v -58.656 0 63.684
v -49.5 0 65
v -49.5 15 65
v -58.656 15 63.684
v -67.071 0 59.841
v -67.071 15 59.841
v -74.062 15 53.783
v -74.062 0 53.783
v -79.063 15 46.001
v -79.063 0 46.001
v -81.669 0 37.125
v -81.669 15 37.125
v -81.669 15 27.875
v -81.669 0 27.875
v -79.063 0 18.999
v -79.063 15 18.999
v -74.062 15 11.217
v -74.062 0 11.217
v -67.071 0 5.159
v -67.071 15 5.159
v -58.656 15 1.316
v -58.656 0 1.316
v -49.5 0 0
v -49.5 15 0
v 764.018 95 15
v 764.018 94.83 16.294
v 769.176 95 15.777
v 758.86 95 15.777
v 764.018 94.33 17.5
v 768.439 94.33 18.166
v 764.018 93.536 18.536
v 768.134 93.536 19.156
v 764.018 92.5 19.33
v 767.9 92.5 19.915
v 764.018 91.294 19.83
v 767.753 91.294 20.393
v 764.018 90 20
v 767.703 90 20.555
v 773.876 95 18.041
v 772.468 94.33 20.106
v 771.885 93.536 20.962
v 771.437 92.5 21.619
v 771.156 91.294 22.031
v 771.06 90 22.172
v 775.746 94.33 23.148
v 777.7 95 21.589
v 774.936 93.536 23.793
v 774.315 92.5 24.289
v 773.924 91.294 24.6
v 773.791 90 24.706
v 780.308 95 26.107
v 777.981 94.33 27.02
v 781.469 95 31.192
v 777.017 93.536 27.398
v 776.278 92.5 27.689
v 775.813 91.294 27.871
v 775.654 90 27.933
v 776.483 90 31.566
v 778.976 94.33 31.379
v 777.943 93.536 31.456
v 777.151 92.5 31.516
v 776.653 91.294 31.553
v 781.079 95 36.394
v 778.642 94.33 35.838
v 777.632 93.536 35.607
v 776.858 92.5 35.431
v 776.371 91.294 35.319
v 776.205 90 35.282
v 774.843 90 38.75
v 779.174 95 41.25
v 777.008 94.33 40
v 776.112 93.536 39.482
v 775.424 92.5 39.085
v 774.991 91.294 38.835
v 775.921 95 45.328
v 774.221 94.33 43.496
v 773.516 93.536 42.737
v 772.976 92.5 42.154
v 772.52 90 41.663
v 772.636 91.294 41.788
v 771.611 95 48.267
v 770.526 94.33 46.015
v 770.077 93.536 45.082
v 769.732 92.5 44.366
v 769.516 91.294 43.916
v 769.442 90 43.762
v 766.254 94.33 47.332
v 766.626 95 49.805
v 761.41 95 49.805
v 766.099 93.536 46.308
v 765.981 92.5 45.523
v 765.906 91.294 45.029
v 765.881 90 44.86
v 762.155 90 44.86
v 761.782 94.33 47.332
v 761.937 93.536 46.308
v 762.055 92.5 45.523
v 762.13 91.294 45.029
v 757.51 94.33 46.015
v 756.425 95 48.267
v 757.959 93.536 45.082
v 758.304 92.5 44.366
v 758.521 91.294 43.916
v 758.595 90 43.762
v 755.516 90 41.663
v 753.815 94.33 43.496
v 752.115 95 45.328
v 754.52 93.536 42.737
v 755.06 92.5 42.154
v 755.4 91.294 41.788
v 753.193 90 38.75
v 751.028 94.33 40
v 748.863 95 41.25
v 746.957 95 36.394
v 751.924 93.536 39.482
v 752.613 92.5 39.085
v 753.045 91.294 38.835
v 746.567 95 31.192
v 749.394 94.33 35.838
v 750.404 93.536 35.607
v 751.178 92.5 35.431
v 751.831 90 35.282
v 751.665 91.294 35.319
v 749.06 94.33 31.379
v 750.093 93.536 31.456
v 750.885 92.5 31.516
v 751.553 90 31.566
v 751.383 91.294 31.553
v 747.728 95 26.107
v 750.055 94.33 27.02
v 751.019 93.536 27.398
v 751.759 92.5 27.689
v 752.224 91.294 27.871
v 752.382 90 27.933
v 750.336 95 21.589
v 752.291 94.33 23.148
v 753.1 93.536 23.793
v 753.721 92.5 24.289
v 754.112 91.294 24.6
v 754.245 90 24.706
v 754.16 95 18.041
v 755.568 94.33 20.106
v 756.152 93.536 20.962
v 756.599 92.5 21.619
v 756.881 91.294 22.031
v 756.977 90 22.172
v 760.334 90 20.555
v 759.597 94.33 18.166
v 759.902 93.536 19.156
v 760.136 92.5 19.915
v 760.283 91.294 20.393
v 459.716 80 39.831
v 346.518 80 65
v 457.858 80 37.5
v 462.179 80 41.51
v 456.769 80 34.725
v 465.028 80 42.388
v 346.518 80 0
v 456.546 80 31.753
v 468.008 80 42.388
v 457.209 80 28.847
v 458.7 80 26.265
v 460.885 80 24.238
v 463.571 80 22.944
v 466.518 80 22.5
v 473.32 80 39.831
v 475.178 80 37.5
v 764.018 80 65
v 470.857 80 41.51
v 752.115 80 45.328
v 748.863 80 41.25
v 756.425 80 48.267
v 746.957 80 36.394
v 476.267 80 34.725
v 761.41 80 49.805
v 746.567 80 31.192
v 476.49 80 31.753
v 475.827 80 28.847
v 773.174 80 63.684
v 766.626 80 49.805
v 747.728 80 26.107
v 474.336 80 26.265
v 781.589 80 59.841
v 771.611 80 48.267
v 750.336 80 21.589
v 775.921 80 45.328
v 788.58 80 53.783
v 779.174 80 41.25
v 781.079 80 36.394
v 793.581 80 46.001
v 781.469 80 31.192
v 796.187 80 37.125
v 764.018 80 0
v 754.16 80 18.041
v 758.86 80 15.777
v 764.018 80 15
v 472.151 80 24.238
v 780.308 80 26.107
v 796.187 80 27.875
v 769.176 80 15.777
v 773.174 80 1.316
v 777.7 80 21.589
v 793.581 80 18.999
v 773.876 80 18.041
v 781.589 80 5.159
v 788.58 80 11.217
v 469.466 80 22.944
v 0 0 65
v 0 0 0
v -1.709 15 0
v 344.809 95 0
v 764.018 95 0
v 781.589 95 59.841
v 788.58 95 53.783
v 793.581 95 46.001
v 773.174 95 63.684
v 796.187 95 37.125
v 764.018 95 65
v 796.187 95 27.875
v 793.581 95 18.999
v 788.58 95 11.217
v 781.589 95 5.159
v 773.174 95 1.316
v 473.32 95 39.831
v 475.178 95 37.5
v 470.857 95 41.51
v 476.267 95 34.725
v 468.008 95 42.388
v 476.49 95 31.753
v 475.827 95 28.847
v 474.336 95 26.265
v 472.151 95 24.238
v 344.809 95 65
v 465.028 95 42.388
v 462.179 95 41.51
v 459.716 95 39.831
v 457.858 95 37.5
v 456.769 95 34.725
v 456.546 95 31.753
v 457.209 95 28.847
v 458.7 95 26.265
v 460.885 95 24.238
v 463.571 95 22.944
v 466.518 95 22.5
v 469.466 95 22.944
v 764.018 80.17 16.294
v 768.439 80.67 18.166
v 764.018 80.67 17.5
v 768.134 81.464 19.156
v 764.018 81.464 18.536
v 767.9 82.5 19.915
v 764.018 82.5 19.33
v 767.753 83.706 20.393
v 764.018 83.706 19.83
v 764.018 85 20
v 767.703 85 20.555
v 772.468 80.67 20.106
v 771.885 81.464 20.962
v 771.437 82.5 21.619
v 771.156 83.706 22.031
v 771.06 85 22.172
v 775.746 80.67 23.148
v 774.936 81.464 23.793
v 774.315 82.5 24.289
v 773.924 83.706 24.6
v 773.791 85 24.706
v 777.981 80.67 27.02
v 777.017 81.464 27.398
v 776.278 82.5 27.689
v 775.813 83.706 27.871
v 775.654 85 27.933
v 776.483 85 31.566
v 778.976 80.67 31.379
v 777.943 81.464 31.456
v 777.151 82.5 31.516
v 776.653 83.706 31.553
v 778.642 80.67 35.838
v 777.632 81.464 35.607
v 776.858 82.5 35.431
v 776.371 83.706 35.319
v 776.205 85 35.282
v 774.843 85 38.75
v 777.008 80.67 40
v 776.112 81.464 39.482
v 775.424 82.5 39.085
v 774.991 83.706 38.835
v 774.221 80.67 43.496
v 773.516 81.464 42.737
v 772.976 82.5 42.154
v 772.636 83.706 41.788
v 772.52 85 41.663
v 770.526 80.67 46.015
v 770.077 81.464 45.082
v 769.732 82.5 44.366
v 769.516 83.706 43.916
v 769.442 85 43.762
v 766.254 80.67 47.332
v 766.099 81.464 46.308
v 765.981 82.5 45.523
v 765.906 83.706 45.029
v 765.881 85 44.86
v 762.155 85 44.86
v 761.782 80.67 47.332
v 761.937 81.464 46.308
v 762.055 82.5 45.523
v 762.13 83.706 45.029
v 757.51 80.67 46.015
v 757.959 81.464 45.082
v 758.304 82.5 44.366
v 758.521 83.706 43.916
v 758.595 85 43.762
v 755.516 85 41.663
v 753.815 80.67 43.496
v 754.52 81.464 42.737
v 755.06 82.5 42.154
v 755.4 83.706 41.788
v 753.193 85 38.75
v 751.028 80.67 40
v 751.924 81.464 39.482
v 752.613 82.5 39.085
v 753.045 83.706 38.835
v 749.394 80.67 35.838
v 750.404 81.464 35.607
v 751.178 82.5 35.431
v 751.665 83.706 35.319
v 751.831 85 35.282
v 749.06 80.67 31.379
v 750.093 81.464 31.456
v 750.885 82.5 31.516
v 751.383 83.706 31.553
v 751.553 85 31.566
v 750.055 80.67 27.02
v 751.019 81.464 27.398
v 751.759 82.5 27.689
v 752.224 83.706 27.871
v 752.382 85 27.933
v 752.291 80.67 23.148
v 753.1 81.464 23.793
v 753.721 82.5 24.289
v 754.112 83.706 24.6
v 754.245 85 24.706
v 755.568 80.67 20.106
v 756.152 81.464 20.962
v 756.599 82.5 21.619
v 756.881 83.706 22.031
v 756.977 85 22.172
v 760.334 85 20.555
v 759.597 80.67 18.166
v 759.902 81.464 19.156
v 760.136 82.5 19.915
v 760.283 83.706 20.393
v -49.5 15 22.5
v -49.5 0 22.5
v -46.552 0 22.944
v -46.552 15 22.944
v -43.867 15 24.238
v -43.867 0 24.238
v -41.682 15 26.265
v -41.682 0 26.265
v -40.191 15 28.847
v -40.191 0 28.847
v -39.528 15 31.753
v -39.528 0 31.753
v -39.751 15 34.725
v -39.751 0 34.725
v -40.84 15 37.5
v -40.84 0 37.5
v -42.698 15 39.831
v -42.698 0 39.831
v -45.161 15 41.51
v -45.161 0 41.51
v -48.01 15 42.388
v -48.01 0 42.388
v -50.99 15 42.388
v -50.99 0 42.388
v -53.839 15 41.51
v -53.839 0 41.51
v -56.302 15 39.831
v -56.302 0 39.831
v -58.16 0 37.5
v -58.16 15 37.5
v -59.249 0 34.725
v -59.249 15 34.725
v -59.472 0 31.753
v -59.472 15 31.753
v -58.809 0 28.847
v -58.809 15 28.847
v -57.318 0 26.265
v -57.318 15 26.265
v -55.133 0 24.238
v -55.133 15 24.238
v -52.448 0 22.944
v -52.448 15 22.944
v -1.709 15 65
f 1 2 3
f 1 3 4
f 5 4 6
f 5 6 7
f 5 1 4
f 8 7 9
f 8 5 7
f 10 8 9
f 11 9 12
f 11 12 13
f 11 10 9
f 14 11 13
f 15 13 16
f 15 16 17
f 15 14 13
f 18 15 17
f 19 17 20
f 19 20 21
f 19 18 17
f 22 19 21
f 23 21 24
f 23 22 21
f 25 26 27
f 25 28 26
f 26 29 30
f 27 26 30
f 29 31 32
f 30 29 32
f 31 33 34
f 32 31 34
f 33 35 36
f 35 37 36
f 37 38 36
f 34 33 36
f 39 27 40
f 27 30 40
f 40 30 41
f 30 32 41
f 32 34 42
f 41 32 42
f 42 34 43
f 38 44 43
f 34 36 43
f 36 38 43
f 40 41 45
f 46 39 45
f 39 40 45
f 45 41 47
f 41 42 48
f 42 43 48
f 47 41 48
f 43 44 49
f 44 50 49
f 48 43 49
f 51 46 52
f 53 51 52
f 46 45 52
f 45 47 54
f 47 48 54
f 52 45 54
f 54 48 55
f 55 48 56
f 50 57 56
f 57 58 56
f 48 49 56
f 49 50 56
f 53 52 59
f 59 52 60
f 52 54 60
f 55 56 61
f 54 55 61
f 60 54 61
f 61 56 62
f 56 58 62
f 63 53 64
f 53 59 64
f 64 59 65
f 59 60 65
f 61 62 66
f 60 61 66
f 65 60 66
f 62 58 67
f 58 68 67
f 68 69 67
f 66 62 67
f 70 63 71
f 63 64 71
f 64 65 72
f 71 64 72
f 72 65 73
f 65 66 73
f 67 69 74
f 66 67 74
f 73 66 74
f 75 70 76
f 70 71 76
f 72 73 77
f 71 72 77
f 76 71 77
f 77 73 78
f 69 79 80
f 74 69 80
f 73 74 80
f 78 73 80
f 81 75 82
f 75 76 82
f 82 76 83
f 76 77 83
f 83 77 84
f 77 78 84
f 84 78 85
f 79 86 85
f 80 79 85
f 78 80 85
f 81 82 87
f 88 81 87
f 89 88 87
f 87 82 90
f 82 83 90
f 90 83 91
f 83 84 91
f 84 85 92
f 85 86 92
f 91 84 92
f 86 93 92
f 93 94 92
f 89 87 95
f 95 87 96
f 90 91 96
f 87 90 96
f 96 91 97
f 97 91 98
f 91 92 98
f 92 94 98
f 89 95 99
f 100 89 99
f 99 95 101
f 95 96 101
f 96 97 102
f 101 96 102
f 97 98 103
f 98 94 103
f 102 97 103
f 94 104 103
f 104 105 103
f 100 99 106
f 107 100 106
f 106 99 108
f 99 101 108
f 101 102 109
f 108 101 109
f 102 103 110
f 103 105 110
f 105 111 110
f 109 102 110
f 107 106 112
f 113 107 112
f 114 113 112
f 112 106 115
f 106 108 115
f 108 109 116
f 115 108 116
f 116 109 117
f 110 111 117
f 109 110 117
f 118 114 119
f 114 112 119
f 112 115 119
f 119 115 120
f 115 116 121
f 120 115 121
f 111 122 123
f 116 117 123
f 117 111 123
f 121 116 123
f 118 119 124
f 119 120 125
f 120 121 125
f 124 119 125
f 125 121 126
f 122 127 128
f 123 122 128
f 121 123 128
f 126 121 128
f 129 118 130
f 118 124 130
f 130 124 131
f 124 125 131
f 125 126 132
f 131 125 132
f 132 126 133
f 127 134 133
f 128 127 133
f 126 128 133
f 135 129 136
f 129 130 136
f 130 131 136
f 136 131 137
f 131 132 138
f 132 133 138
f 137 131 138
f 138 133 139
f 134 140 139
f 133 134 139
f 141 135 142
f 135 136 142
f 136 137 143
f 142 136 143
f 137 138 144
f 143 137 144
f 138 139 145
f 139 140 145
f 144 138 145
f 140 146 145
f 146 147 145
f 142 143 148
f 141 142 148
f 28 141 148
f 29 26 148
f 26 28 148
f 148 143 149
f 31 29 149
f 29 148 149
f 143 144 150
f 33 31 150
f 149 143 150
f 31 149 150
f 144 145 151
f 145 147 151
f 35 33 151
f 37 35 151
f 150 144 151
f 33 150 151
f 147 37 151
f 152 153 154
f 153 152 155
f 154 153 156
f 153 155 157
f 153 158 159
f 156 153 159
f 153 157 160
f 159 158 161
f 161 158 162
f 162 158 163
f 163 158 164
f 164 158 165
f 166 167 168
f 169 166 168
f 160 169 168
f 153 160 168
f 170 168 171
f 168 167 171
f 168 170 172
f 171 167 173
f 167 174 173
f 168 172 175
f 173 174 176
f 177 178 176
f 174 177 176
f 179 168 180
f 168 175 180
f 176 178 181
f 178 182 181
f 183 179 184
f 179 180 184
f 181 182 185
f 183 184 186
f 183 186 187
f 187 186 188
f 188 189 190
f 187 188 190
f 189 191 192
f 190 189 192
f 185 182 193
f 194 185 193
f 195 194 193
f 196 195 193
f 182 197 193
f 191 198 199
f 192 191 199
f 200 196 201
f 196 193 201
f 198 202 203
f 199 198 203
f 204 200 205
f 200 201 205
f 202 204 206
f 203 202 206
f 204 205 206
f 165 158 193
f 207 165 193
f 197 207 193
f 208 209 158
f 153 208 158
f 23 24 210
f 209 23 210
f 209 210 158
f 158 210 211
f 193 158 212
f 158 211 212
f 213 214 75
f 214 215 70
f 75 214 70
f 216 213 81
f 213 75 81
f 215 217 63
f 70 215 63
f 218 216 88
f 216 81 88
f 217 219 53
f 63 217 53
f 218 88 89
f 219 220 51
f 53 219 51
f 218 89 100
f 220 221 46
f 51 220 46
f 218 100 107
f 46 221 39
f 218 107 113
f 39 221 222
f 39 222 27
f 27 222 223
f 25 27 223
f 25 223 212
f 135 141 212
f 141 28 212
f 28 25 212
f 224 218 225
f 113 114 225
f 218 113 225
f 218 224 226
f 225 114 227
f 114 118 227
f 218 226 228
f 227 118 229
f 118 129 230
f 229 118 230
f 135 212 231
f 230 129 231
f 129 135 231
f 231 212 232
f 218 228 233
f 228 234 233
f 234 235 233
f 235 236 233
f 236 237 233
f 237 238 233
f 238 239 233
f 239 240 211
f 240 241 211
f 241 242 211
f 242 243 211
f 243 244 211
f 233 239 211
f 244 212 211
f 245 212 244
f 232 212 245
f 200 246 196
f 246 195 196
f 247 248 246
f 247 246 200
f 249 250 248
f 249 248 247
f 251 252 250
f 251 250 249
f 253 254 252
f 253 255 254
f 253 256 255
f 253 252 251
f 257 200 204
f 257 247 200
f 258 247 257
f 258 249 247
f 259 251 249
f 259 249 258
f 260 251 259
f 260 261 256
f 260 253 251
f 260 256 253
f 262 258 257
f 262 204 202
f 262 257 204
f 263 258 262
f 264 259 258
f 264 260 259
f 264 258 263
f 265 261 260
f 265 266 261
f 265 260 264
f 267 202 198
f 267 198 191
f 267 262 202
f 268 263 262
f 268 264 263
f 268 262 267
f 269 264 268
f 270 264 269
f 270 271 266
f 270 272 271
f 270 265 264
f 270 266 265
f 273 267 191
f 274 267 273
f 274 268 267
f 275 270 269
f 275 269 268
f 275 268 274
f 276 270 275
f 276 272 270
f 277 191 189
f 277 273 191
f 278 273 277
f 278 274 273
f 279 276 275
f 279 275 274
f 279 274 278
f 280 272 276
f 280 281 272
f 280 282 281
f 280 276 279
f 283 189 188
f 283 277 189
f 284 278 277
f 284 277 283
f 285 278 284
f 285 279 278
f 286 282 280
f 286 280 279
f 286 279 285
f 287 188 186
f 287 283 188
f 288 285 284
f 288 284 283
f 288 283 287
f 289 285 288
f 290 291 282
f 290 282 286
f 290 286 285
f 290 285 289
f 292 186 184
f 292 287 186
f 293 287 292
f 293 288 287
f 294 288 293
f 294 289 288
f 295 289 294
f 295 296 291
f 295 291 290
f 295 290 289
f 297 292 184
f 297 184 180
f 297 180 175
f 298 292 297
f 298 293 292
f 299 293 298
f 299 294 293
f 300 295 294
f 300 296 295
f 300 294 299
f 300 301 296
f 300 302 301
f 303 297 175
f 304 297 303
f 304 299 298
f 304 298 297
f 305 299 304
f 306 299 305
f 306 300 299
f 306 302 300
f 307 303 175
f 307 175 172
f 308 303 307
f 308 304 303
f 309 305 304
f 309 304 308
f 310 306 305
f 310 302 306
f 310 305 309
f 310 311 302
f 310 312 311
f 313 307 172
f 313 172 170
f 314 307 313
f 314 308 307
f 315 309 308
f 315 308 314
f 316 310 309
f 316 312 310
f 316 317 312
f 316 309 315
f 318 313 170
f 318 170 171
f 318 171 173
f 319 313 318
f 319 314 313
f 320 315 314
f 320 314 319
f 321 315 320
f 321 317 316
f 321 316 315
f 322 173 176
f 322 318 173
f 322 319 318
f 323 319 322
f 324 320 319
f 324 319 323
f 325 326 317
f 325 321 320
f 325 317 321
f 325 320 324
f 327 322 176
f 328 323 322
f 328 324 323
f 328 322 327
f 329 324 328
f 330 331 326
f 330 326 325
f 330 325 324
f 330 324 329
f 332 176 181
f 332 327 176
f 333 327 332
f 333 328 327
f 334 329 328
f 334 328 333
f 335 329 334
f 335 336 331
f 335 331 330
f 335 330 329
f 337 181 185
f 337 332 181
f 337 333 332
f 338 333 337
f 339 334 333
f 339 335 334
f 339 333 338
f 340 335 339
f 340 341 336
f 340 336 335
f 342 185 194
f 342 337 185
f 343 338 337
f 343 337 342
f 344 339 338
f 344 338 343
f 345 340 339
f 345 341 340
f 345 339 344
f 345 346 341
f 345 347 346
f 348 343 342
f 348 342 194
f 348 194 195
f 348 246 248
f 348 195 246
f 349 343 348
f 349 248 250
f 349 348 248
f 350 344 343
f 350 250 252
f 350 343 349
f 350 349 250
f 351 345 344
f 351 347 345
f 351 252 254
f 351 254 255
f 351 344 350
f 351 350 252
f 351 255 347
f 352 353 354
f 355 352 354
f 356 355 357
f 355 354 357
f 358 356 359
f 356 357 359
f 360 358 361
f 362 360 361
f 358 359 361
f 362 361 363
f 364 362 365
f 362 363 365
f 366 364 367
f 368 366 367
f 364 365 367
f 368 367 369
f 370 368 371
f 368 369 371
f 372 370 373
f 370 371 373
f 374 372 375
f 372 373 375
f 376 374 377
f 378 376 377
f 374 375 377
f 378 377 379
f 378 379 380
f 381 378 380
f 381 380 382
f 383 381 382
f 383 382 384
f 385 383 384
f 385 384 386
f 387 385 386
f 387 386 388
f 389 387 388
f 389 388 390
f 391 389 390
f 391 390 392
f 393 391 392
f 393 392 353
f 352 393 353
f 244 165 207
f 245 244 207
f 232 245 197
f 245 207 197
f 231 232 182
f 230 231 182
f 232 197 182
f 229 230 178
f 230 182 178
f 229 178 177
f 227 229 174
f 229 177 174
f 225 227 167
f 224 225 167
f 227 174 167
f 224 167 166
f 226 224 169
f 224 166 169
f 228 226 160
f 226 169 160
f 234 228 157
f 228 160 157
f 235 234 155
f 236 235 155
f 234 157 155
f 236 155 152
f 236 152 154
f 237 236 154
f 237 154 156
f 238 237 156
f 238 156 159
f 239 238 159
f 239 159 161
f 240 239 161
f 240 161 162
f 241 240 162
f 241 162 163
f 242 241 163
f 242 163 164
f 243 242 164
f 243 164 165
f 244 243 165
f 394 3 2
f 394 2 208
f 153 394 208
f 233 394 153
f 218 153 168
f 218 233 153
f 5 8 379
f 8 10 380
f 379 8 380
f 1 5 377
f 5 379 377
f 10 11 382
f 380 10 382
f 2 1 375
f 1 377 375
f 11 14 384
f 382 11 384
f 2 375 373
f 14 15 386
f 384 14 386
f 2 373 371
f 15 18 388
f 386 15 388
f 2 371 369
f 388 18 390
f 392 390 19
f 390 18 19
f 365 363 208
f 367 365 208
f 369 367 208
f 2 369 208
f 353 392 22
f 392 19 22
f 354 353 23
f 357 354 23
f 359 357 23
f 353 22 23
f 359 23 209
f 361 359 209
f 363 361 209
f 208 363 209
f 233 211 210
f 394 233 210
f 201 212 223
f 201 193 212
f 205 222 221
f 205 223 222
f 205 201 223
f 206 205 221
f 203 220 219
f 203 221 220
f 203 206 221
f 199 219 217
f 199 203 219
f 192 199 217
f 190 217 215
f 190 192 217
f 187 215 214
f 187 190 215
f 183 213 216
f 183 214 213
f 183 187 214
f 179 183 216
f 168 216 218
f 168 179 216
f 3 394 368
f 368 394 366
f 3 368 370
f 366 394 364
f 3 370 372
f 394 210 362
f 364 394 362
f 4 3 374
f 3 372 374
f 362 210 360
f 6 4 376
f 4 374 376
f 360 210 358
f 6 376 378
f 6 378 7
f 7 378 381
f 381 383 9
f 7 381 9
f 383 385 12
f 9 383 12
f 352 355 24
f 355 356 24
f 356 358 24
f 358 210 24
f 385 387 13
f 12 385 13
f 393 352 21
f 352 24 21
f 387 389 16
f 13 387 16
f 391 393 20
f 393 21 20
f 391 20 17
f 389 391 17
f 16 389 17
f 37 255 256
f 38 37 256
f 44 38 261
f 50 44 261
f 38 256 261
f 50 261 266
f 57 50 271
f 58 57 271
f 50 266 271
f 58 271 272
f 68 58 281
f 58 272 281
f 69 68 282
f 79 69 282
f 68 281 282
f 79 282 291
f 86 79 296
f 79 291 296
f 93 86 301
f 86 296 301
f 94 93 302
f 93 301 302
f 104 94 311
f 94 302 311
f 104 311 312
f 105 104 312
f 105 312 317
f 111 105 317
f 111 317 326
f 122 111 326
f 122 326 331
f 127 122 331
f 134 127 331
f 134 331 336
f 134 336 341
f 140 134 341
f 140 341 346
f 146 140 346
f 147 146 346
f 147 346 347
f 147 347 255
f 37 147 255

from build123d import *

# Parameters (mm, degrees)
BOSS_EXTRUDE1_DEPTH = 65
FILLET1_RADIUS      = 32.5
FILLET1_LENGTH      = 15
FILLET2_RADIUS      = 32.5
FILLET2_LENGTH      = 15
SKETCH3_R           = 10
CUT_EXTRUDE1_DEPTH  = 20
SKETCH4_R           = 10
CUT_EXTRUDE2_DEPTH  = 20
SKETCH5_R           = 12.5
CUT_EXTRUDE3_DEPTH  = 20
FILLET3_R           = 5


with BuildPart() as part:
    # Sketch1 → Boss-Extrude1 (new body)
    with BuildSketch(Plane.XY):
        Polygon((-82, 0), (0, 0), (346.518069943, 80), (796.518069943, 80), (796.518069943, 95), (344.809035818, 95), (-1.709034125, 15), (-82, 15), align=None)
    extrude(amount=BOSS_EXTRUDE1_DEPTH)

    # Fillet1: full round fillet: the end face becomes a half cylinder, R = half its width
    fillet1_face = Plane((-82, 7.5, 32.5), x_dir=(0, -1, 0), z_dir=(-1, 0, 0))  # on the end face: x along it, z out of the body
    fillet1_slab = fillet1_face.offset(-FILLET1_RADIUS / 2) * Box(FILLET1_LENGTH, 2 * FILLET1_RADIUS, FILLET1_RADIUS, mode=Mode.PRIVATE)  # the body's end, R deep
    fillet1_round = Plane((-49.5, 7.5, 32.5), x_dir=(-1, 0, 0), z_dir=(0, -1, 0)) * Cylinder(FILLET1_RADIUS, FILLET1_LENGTH, mode=Mode.PRIVATE)  # its axis R under the face
    add(fillet1_slab - fillet1_round, mode=Mode.SUBTRACT)

    # Fillet2: full round fillet: the end face becomes a half cylinder, R = half its width
    fillet2_face = Plane((796.518069943, 87.5, 32.5), x_dir=(0, -1, 0), z_dir=(1, 0, 0))  # on the end face: x along it, z out of the body
    fillet2_slab = fillet2_face.offset(-FILLET2_RADIUS / 2) * Box(FILLET2_LENGTH, 2 * FILLET2_RADIUS, FILLET2_RADIUS, mode=Mode.PRIVATE)  # the body's end, R deep
    fillet2_round = Plane((764.018069943, 87.5, 32.5), x_dir=(1, 0, 0), z_dir=(0, -1, 0)) * Cylinder(FILLET2_RADIUS, FILLET2_LENGTH, mode=Mode.PRIVATE)  # its axis R under the face
    add(fillet2_slab - fillet2_round, mode=Mode.SUBTRACT)

    # Sketch3 → Cut-Extrude1 (cut)
    with BuildSketch(Plane.XZ.offset(-80)):
        with Locations(Location((466.518069943, 32.5, 0), (0, 0, 270))):
            Circle(SKETCH3_R)
    extrude(amount=-CUT_EXTRUDE1_DEPTH, mode=Mode.SUBTRACT)

    # Sketch4 → Cut-Extrude2 (cut)
    with BuildSketch(Plane.XZ):
        with Locations(Location((-49.5, 32.5, 0), (0, 0, 270))):
            Circle(SKETCH4_R)
    extrude(amount=-CUT_EXTRUDE2_DEPTH, mode=Mode.SUBTRACT)

    # Sketch5 → Cut-Extrude3 (cut)
    with BuildSketch(Plane.XZ.offset(-80)):
        with Locations(Location((764.018069943, 32.5, 0), (0, 0, 270))):
            Circle(SKETCH5_R)
    extrude(amount=-CUT_EXTRUDE3_DEPTH, mode=Mode.SUBTRACT)

    # Fillet3
    fillet3_edges = [part.edges().sort_by_distance(p)[0] for p in [
        (764.018069943, 95, 45),
        (764.018069943, 80, 45),
    ]]
    fillet(fillet3_edges, radius=FILLET3_R)


solid = part.part
